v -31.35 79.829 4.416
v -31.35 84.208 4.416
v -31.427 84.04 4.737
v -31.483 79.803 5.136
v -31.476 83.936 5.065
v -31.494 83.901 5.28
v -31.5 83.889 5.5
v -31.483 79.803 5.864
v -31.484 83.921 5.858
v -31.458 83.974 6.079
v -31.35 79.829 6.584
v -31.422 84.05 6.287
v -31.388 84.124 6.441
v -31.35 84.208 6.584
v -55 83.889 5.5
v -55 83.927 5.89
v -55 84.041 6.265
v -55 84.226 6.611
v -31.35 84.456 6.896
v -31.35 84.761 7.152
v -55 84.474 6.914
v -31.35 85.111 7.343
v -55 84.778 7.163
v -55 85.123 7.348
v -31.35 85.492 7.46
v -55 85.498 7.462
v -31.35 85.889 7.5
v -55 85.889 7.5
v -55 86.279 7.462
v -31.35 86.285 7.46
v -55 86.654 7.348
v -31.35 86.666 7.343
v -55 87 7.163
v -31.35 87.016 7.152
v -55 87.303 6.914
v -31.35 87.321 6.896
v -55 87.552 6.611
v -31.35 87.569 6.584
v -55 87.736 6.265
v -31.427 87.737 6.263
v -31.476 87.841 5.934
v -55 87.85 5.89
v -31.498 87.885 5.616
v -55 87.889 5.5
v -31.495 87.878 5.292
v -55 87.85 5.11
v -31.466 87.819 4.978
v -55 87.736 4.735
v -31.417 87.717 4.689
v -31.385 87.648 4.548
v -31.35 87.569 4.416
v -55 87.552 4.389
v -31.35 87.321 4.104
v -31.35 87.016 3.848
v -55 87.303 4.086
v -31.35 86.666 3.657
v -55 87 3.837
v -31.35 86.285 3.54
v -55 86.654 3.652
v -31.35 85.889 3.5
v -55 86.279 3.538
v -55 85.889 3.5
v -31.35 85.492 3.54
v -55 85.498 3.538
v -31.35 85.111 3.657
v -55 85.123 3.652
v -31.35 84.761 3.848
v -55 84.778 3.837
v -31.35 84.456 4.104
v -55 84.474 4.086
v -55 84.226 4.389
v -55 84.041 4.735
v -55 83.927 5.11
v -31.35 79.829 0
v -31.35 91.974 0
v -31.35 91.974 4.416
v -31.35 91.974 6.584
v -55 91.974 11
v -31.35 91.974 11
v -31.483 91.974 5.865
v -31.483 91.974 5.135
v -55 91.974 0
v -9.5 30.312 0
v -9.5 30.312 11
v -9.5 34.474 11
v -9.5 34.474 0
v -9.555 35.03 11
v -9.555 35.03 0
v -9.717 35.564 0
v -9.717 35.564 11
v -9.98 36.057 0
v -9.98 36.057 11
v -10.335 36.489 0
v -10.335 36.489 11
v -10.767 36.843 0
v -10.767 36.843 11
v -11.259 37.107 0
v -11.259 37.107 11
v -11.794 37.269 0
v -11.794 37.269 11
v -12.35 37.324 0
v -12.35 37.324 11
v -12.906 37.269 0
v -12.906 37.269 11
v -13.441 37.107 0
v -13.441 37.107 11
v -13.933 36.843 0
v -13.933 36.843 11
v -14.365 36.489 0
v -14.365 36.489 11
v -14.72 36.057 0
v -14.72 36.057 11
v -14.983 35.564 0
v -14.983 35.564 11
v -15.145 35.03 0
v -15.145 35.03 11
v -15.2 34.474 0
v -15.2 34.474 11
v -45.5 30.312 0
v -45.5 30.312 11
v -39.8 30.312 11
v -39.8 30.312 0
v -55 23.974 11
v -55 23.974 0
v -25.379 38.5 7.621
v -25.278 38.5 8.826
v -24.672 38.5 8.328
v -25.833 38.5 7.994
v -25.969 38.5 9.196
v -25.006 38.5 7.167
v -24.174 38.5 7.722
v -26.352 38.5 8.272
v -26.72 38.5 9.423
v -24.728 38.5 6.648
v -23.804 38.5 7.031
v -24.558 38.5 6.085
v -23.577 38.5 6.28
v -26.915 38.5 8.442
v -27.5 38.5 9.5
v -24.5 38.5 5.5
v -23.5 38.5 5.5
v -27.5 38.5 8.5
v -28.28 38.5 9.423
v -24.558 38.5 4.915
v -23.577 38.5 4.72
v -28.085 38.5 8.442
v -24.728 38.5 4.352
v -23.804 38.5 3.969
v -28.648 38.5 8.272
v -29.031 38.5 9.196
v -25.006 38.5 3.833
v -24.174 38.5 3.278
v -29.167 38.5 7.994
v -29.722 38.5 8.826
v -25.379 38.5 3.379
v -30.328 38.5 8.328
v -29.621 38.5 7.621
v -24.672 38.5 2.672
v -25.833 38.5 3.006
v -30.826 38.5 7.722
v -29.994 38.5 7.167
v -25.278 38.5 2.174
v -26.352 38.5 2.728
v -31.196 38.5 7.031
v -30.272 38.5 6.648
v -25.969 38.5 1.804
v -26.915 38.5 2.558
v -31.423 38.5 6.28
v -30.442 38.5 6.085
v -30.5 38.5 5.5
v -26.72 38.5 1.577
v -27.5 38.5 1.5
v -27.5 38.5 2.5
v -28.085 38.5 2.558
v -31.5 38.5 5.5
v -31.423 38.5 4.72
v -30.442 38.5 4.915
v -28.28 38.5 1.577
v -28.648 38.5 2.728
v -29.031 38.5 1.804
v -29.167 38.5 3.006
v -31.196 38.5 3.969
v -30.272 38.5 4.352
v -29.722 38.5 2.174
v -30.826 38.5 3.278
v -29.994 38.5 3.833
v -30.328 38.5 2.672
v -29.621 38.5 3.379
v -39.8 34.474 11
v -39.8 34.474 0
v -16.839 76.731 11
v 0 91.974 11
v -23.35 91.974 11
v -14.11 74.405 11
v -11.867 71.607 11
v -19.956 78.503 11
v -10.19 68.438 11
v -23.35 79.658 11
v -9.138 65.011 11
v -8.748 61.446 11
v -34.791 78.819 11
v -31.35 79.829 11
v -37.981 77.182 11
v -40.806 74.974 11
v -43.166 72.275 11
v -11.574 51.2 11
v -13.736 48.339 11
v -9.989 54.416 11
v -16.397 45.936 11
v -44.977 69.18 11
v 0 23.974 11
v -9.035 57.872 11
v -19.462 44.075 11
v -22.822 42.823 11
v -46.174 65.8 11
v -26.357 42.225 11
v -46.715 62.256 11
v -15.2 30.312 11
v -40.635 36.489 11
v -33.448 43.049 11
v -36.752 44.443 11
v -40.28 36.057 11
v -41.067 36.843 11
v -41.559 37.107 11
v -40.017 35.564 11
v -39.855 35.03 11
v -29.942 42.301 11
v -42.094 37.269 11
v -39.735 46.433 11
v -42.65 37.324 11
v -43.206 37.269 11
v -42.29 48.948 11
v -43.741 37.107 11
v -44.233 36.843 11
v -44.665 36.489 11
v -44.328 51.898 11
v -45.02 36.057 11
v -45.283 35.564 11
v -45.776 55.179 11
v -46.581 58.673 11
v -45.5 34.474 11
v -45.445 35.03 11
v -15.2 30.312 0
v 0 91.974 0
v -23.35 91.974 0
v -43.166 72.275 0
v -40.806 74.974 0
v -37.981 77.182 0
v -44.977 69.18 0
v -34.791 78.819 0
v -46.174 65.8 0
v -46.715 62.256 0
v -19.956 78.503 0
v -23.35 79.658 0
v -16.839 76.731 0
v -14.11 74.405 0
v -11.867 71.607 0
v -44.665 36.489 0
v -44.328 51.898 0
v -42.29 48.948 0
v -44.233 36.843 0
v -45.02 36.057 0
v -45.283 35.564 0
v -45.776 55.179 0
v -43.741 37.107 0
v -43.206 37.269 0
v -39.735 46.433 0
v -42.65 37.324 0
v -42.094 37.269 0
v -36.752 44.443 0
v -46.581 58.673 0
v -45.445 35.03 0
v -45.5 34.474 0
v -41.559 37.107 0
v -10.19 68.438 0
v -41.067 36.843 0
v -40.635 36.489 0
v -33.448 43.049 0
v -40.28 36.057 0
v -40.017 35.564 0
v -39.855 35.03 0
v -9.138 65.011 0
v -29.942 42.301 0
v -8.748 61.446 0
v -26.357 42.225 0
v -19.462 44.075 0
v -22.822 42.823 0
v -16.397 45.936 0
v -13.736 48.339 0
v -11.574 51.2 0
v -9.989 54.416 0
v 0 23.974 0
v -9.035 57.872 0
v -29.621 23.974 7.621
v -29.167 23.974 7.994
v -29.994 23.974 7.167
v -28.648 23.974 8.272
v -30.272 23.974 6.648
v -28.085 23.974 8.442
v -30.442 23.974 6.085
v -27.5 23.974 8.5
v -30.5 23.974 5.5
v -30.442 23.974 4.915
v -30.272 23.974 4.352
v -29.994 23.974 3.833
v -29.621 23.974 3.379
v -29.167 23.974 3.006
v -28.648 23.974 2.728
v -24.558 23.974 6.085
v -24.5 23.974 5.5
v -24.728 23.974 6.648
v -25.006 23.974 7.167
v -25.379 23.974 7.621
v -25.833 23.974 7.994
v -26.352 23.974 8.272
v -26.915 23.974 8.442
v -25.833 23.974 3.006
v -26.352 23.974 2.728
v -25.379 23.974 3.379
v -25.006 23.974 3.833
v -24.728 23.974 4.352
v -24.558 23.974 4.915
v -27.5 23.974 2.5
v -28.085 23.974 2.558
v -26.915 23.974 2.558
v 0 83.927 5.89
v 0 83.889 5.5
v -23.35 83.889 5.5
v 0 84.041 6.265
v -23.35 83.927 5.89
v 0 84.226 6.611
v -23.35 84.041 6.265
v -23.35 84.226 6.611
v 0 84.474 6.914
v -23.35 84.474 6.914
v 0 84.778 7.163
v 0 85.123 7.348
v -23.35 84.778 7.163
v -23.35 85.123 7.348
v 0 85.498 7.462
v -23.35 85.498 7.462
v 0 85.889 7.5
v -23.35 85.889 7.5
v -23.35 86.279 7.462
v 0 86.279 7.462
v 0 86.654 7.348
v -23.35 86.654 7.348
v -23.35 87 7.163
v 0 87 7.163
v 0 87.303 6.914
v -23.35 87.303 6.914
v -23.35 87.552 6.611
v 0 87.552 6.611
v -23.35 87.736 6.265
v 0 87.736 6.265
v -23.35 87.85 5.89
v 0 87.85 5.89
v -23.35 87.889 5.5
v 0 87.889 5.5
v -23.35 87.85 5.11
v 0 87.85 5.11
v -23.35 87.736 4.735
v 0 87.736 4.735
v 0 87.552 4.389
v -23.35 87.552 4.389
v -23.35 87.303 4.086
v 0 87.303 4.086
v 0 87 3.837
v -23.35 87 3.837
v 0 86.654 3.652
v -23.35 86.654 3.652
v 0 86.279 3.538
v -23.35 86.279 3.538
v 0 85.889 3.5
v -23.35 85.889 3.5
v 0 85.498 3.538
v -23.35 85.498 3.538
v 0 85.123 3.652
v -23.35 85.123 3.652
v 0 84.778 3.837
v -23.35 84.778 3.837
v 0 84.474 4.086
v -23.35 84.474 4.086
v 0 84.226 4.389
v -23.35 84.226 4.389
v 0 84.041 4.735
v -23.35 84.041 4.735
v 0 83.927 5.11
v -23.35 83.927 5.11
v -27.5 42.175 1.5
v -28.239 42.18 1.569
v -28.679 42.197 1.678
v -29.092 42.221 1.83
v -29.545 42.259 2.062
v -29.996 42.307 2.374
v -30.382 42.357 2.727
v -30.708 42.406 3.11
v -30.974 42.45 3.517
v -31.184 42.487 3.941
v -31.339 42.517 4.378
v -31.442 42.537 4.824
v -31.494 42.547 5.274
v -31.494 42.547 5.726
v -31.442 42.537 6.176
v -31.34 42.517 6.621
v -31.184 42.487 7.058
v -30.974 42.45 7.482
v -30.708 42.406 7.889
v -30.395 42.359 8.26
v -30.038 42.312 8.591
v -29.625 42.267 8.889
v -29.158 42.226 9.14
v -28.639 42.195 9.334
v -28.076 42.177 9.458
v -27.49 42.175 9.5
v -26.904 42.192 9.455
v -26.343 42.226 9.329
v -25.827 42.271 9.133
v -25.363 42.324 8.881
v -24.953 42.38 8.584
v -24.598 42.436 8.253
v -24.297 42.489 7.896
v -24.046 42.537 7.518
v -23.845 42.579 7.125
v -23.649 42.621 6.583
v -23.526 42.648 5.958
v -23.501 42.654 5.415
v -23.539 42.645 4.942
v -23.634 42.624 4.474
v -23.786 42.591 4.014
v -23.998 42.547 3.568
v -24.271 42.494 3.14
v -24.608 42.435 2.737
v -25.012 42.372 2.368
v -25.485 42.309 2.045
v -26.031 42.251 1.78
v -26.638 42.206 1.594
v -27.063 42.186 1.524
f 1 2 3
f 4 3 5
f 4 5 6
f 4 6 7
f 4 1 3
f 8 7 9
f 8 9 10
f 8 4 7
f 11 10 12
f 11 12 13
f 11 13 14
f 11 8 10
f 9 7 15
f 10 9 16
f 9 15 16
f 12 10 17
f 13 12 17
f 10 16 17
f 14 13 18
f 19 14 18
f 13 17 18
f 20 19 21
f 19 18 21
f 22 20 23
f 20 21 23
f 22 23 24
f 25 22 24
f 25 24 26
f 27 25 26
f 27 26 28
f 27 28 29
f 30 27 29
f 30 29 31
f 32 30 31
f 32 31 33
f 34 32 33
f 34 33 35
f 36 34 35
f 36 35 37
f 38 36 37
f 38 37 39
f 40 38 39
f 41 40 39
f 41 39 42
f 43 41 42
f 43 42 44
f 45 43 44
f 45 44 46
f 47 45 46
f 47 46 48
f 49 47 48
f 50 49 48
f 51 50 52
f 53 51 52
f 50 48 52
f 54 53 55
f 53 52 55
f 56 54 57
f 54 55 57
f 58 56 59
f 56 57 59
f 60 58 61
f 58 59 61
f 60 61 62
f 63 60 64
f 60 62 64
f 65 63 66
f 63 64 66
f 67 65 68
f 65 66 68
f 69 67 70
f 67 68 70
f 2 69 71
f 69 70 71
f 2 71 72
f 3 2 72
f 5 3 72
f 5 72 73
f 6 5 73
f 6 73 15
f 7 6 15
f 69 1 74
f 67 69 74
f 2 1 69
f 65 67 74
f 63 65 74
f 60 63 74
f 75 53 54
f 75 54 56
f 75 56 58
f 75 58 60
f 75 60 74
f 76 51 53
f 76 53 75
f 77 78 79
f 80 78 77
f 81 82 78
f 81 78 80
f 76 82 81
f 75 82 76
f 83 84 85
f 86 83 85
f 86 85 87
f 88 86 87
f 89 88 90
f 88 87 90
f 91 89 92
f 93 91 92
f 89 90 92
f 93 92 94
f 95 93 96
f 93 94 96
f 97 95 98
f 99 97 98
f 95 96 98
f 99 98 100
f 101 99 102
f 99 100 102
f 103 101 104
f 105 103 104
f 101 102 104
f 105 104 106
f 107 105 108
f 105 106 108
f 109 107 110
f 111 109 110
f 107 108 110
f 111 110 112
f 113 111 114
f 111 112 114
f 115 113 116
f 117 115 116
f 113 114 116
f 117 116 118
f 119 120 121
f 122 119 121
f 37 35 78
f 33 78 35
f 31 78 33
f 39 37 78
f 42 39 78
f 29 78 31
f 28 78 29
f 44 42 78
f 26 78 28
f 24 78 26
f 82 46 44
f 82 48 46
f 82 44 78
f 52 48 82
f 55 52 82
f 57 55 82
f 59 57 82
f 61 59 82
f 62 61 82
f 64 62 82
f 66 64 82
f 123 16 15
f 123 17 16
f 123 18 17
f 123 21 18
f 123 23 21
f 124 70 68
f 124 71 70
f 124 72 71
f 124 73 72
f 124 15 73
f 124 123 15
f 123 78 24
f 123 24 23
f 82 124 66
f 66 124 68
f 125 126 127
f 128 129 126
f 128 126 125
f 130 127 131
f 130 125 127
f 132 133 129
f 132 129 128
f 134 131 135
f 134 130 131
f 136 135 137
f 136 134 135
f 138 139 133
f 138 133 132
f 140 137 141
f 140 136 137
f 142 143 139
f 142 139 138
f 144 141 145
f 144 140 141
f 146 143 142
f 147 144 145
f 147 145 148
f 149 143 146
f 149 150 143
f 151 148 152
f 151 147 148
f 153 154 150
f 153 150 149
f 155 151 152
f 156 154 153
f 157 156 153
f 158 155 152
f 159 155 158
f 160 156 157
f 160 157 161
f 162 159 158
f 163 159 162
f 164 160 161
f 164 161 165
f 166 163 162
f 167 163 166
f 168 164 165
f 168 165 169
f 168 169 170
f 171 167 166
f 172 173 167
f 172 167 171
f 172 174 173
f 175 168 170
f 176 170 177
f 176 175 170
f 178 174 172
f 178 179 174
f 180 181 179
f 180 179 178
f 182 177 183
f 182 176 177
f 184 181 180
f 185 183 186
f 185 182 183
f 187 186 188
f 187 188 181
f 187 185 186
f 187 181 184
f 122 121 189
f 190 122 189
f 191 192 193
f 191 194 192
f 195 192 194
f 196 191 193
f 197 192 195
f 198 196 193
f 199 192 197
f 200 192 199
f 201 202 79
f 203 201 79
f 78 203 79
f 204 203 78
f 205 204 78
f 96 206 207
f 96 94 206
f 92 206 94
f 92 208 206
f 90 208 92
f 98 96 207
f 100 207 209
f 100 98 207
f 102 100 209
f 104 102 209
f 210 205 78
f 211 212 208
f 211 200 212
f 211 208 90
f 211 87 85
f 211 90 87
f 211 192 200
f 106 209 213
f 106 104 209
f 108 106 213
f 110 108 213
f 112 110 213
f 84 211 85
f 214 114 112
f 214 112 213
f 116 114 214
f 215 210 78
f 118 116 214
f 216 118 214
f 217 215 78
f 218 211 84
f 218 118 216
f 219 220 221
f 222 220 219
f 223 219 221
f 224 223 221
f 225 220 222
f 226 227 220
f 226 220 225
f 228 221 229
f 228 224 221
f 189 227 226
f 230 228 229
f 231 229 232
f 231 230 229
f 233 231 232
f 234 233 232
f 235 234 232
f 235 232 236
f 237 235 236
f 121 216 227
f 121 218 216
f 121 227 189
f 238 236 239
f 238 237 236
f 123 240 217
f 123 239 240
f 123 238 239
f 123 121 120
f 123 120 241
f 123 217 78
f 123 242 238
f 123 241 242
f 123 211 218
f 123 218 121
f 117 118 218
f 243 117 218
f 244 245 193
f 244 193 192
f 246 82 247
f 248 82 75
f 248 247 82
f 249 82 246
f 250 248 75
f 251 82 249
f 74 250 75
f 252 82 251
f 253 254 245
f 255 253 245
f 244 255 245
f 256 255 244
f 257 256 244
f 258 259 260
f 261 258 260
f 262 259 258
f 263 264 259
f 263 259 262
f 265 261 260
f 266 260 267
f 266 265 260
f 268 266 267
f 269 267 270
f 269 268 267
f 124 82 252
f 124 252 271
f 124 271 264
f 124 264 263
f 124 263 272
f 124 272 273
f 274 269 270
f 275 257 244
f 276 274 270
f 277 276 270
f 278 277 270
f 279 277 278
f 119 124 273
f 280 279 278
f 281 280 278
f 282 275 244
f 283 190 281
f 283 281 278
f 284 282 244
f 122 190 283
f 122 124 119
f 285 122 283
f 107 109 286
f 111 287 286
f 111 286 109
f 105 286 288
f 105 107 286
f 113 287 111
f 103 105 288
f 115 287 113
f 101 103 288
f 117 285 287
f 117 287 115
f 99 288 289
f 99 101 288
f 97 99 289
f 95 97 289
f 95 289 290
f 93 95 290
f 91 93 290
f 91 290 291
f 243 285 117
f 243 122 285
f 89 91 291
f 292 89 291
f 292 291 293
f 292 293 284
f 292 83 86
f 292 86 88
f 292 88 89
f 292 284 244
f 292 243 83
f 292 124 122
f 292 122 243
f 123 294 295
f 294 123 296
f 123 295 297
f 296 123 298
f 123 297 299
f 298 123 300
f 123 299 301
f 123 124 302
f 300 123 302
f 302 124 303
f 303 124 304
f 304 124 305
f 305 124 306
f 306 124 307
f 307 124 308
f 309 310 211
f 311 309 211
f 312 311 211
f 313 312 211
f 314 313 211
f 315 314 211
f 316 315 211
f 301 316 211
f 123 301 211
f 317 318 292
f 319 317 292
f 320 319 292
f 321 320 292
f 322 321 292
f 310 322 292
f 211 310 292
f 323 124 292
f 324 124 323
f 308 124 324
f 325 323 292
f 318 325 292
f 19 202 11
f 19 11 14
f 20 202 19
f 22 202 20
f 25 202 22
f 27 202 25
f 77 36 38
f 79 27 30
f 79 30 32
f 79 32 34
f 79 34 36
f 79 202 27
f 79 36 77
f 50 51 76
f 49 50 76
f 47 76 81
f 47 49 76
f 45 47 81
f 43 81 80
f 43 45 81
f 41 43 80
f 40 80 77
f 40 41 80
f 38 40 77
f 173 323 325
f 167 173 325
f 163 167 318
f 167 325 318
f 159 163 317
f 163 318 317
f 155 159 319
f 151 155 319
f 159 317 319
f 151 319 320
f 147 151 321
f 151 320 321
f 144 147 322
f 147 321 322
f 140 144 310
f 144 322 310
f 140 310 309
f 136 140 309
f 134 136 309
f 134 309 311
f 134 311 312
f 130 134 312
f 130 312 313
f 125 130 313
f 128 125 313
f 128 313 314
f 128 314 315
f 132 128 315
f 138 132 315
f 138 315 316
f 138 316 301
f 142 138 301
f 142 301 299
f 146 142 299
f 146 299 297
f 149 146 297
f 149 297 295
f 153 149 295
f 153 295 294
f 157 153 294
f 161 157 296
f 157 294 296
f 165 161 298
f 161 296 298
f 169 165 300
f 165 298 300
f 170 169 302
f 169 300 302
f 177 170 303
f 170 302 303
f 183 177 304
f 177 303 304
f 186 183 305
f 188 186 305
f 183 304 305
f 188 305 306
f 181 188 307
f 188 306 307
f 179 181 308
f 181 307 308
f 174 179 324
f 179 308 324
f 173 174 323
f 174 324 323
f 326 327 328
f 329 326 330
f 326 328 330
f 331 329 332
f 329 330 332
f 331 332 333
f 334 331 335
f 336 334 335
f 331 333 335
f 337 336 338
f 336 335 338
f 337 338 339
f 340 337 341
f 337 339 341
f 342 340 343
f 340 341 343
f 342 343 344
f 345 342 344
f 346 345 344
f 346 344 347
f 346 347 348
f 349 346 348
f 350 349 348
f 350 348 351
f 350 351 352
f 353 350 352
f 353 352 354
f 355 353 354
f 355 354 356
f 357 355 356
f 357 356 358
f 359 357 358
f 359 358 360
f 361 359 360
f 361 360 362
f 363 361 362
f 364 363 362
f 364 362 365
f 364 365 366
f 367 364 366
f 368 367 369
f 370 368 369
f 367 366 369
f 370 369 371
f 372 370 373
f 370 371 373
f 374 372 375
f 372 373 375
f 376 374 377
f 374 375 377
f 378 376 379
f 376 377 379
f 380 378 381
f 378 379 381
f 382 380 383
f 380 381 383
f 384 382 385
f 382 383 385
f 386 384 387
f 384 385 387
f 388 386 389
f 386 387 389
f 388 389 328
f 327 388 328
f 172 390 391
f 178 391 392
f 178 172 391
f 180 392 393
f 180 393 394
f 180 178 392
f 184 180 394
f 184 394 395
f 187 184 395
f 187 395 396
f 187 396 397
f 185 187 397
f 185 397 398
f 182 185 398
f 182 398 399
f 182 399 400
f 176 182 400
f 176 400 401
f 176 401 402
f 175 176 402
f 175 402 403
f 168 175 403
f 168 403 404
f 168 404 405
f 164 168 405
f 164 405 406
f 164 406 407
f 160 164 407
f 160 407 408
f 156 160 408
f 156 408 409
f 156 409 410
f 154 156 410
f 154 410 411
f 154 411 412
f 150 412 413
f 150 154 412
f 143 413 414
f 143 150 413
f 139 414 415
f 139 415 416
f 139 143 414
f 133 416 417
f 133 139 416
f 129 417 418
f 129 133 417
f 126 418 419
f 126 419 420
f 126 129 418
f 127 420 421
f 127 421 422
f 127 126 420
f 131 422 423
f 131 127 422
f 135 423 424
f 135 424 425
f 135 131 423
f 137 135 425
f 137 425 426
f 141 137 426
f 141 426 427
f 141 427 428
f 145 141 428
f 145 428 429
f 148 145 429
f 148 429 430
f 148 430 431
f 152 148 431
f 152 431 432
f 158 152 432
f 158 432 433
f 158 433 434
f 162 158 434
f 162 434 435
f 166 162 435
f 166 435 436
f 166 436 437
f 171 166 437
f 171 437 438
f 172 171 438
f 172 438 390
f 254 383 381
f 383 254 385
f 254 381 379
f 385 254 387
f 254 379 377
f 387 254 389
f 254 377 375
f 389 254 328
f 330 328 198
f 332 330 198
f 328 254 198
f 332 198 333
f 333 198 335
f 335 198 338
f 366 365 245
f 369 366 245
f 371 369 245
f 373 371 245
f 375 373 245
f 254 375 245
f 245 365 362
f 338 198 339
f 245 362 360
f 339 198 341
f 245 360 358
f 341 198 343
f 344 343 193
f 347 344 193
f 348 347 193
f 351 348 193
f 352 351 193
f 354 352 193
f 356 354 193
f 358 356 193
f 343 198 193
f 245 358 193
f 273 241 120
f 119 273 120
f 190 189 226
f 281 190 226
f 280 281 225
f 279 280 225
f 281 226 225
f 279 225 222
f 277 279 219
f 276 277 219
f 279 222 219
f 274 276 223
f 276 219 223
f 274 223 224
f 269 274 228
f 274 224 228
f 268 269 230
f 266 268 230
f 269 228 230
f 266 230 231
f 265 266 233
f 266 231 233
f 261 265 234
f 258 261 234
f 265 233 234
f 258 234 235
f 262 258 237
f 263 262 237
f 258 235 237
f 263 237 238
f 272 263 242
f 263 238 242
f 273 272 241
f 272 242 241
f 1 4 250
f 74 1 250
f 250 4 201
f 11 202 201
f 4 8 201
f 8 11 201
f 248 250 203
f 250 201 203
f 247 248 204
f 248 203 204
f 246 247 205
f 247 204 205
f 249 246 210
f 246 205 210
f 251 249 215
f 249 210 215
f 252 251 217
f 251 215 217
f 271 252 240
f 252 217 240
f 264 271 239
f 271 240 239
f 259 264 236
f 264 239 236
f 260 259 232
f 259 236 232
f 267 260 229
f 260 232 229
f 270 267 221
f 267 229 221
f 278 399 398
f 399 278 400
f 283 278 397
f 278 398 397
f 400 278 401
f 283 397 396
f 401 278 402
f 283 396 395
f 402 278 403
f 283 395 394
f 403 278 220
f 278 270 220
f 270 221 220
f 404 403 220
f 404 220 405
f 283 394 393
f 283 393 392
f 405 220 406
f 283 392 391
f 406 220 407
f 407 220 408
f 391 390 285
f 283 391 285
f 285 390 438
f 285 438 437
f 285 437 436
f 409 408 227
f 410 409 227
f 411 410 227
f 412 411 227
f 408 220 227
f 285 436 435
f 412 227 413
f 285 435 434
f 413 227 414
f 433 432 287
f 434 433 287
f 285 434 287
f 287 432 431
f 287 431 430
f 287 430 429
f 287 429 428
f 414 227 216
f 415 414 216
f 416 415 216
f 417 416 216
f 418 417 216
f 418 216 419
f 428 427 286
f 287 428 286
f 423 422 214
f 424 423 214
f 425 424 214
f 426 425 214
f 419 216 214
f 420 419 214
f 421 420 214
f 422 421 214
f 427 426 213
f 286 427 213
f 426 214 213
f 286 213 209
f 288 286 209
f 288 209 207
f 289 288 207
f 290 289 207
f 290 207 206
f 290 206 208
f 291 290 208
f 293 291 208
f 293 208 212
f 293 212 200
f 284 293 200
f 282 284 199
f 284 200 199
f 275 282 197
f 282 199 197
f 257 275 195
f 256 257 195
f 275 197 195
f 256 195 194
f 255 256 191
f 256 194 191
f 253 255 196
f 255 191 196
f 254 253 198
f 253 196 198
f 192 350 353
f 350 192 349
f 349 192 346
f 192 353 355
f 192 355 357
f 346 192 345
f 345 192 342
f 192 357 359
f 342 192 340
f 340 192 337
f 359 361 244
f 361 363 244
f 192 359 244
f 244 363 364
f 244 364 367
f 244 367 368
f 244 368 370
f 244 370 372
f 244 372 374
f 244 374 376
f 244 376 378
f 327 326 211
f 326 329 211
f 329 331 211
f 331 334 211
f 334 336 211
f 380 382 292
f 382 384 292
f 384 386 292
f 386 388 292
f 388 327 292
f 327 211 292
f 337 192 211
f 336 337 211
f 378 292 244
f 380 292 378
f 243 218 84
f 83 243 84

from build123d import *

# Parameters (mm, degrees)
SKETCH1_W           = 55
SKETCH1_H           = 18
BOSS_EXTRUDE1_DEPTH = 15
SKETCH2_W           = 55
SKETCH2_H           = 15
BOSS_EXTRUDE2_DEPTH = 50
SKETCH14_R          = 19
CUT_EXTRUDE14_DEPTH = 21
SKETCH6_W           = 8
SKETCH6_H           = 27.884489578
CUT_EXTRUDE3_DEPTH  = 50
SKETCH9_R           = 2
CUT_EXTRUDE5_DEPTH  = 55
CUT_EXTRUDE6_DEPTH  = 55
SKETCH16_W          = 55
SKETCH16_H          = 4
CUT_EXTRUDE16_DEPTH = 73
SKETCH17_R          = 3
CUT_EXTRUDE17_DEPTH = 89
SKETCH18_R          = 4
CUT_EXTRUDE18_DEPTH = 89


with BuildPart() as part:
    # Sketch1 → Boss-Extrude1 (new body)
    with BuildSketch(Plane.XY):
        with Locations((-27.5, 32.973684211)):
            Rectangle(SKETCH1_W, SKETCH1_H)
    extrude(amount=BOSS_EXTRUDE1_DEPTH)

    # Sketch2 → Boss-Extrude2 (add)
    with BuildSketch(Plane(origin=(0, 41.973684211, 0), x_dir=(1, 0, 0), z_dir=(0, 1, 0))):
        with Locations((-27.5, -7.5)):
            Rectangle(SKETCH2_W, SKETCH2_H)
    extrude(amount=BOSS_EXTRUDE2_DEPTH)

    # Sketch14 → Cut-Extrude14 (cut)
    with BuildSketch(Plane.XY.offset(15)):
        with Locations((-27.746201243, 61.173684211)):
            Circle(SKETCH14_R)
    extrude(amount=-CUT_EXTRUDE14_DEPTH, mode=Mode.SUBTRACT)

    # Sketch6 → Cut-Extrude3 (cut)
    with BuildSketch(Plane.XY.offset(15)):
        with Locations((-27.350353451, 79.894224222)):
            Rectangle(SKETCH6_W, SKETCH6_H)
    extrude(amount=-CUT_EXTRUDE3_DEPTH, mode=Mode.SUBTRACT)

    # Sketch9 → Cut-Extrude5 (cut)
    with BuildSketch(Plane.ZY.offset(55)):
        with Locations(Location((5.5, 85.888652512, 0), (0, 0, 270))):
            Circle(SKETCH9_R)
    extrude(amount=-CUT_EXTRUDE5_DEPTH, mode=Mode.SUBTRACT)

    # Sketch10 → Cut-Extrude6 (cut)
    with BuildSketch(Plane.XY.offset(15)):
        with BuildLine():
            Line((-9.5, 30.311825803), (-9.5, 34.473684211))
            ThreePointArc((-9.5, 34.473684211), (-12.35, 37.323684211), (-15.2, 34.473684211))
            Line((-15.2, 34.473684211), (-15.2, 30.311825803))
            Line((-15.2, 30.311825803), (-9.5, 30.311825803))
        make_face()
        with BuildLine():
            Line((-45.5, 30.311825803), (-39.8, 30.311825803))
            Line((-39.8, 30.311825803), (-39.8, 34.473684211))
            ThreePointArc((-39.8, 34.473684211), (-42.65, 37.323684211), (-45.5, 34.473684211))
            Line((-45.5, 34.473684211), (-45.5, 30.311825803))
        make_face()
    extrude(amount=-CUT_EXTRUDE6_DEPTH, mode=Mode.SUBTRACT)

    # Sketch16 → Cut-Extrude16 (cut)
    with BuildSketch(Plane(origin=(0, 23.973684211, 0), x_dir=(-1, 0, 0), z_dir=(0, -1, 0))):
        with Locations((27.5, -13)):
            Rectangle(SKETCH16_W, SKETCH16_H)
    extrude(amount=-CUT_EXTRUDE16_DEPTH, mode=Mode.SUBTRACT)

    # Sketch17 → Cut-Extrude17 (cut)
    with BuildSketch(Plane(origin=(0, 23.973684211, 0), x_dir=(-1, 0, 0), z_dir=(0, -1, 0))):
        with Locations(Location((27.5, -5.5, 0), (0, 0, 90))):
            Circle(SKETCH17_R)
    extrude(amount=-CUT_EXTRUDE17_DEPTH, mode=Mode.SUBTRACT)

    # Sketch18 → Cut-Extrude18 (cut)
    with BuildSketch(Plane(origin=(0, 38.5, 0), x_dir=(1, 0, 0), z_dir=(0, 1, 0))):
        with Locations(Location((-27.5, -5.5, 0), (0, 0, 90))):
            Circle(SKETCH18_R)
    extrude(amount=CUT_EXTRUDE18_DEPTH, mode=Mode.SUBTRACT)


solid = part.part
